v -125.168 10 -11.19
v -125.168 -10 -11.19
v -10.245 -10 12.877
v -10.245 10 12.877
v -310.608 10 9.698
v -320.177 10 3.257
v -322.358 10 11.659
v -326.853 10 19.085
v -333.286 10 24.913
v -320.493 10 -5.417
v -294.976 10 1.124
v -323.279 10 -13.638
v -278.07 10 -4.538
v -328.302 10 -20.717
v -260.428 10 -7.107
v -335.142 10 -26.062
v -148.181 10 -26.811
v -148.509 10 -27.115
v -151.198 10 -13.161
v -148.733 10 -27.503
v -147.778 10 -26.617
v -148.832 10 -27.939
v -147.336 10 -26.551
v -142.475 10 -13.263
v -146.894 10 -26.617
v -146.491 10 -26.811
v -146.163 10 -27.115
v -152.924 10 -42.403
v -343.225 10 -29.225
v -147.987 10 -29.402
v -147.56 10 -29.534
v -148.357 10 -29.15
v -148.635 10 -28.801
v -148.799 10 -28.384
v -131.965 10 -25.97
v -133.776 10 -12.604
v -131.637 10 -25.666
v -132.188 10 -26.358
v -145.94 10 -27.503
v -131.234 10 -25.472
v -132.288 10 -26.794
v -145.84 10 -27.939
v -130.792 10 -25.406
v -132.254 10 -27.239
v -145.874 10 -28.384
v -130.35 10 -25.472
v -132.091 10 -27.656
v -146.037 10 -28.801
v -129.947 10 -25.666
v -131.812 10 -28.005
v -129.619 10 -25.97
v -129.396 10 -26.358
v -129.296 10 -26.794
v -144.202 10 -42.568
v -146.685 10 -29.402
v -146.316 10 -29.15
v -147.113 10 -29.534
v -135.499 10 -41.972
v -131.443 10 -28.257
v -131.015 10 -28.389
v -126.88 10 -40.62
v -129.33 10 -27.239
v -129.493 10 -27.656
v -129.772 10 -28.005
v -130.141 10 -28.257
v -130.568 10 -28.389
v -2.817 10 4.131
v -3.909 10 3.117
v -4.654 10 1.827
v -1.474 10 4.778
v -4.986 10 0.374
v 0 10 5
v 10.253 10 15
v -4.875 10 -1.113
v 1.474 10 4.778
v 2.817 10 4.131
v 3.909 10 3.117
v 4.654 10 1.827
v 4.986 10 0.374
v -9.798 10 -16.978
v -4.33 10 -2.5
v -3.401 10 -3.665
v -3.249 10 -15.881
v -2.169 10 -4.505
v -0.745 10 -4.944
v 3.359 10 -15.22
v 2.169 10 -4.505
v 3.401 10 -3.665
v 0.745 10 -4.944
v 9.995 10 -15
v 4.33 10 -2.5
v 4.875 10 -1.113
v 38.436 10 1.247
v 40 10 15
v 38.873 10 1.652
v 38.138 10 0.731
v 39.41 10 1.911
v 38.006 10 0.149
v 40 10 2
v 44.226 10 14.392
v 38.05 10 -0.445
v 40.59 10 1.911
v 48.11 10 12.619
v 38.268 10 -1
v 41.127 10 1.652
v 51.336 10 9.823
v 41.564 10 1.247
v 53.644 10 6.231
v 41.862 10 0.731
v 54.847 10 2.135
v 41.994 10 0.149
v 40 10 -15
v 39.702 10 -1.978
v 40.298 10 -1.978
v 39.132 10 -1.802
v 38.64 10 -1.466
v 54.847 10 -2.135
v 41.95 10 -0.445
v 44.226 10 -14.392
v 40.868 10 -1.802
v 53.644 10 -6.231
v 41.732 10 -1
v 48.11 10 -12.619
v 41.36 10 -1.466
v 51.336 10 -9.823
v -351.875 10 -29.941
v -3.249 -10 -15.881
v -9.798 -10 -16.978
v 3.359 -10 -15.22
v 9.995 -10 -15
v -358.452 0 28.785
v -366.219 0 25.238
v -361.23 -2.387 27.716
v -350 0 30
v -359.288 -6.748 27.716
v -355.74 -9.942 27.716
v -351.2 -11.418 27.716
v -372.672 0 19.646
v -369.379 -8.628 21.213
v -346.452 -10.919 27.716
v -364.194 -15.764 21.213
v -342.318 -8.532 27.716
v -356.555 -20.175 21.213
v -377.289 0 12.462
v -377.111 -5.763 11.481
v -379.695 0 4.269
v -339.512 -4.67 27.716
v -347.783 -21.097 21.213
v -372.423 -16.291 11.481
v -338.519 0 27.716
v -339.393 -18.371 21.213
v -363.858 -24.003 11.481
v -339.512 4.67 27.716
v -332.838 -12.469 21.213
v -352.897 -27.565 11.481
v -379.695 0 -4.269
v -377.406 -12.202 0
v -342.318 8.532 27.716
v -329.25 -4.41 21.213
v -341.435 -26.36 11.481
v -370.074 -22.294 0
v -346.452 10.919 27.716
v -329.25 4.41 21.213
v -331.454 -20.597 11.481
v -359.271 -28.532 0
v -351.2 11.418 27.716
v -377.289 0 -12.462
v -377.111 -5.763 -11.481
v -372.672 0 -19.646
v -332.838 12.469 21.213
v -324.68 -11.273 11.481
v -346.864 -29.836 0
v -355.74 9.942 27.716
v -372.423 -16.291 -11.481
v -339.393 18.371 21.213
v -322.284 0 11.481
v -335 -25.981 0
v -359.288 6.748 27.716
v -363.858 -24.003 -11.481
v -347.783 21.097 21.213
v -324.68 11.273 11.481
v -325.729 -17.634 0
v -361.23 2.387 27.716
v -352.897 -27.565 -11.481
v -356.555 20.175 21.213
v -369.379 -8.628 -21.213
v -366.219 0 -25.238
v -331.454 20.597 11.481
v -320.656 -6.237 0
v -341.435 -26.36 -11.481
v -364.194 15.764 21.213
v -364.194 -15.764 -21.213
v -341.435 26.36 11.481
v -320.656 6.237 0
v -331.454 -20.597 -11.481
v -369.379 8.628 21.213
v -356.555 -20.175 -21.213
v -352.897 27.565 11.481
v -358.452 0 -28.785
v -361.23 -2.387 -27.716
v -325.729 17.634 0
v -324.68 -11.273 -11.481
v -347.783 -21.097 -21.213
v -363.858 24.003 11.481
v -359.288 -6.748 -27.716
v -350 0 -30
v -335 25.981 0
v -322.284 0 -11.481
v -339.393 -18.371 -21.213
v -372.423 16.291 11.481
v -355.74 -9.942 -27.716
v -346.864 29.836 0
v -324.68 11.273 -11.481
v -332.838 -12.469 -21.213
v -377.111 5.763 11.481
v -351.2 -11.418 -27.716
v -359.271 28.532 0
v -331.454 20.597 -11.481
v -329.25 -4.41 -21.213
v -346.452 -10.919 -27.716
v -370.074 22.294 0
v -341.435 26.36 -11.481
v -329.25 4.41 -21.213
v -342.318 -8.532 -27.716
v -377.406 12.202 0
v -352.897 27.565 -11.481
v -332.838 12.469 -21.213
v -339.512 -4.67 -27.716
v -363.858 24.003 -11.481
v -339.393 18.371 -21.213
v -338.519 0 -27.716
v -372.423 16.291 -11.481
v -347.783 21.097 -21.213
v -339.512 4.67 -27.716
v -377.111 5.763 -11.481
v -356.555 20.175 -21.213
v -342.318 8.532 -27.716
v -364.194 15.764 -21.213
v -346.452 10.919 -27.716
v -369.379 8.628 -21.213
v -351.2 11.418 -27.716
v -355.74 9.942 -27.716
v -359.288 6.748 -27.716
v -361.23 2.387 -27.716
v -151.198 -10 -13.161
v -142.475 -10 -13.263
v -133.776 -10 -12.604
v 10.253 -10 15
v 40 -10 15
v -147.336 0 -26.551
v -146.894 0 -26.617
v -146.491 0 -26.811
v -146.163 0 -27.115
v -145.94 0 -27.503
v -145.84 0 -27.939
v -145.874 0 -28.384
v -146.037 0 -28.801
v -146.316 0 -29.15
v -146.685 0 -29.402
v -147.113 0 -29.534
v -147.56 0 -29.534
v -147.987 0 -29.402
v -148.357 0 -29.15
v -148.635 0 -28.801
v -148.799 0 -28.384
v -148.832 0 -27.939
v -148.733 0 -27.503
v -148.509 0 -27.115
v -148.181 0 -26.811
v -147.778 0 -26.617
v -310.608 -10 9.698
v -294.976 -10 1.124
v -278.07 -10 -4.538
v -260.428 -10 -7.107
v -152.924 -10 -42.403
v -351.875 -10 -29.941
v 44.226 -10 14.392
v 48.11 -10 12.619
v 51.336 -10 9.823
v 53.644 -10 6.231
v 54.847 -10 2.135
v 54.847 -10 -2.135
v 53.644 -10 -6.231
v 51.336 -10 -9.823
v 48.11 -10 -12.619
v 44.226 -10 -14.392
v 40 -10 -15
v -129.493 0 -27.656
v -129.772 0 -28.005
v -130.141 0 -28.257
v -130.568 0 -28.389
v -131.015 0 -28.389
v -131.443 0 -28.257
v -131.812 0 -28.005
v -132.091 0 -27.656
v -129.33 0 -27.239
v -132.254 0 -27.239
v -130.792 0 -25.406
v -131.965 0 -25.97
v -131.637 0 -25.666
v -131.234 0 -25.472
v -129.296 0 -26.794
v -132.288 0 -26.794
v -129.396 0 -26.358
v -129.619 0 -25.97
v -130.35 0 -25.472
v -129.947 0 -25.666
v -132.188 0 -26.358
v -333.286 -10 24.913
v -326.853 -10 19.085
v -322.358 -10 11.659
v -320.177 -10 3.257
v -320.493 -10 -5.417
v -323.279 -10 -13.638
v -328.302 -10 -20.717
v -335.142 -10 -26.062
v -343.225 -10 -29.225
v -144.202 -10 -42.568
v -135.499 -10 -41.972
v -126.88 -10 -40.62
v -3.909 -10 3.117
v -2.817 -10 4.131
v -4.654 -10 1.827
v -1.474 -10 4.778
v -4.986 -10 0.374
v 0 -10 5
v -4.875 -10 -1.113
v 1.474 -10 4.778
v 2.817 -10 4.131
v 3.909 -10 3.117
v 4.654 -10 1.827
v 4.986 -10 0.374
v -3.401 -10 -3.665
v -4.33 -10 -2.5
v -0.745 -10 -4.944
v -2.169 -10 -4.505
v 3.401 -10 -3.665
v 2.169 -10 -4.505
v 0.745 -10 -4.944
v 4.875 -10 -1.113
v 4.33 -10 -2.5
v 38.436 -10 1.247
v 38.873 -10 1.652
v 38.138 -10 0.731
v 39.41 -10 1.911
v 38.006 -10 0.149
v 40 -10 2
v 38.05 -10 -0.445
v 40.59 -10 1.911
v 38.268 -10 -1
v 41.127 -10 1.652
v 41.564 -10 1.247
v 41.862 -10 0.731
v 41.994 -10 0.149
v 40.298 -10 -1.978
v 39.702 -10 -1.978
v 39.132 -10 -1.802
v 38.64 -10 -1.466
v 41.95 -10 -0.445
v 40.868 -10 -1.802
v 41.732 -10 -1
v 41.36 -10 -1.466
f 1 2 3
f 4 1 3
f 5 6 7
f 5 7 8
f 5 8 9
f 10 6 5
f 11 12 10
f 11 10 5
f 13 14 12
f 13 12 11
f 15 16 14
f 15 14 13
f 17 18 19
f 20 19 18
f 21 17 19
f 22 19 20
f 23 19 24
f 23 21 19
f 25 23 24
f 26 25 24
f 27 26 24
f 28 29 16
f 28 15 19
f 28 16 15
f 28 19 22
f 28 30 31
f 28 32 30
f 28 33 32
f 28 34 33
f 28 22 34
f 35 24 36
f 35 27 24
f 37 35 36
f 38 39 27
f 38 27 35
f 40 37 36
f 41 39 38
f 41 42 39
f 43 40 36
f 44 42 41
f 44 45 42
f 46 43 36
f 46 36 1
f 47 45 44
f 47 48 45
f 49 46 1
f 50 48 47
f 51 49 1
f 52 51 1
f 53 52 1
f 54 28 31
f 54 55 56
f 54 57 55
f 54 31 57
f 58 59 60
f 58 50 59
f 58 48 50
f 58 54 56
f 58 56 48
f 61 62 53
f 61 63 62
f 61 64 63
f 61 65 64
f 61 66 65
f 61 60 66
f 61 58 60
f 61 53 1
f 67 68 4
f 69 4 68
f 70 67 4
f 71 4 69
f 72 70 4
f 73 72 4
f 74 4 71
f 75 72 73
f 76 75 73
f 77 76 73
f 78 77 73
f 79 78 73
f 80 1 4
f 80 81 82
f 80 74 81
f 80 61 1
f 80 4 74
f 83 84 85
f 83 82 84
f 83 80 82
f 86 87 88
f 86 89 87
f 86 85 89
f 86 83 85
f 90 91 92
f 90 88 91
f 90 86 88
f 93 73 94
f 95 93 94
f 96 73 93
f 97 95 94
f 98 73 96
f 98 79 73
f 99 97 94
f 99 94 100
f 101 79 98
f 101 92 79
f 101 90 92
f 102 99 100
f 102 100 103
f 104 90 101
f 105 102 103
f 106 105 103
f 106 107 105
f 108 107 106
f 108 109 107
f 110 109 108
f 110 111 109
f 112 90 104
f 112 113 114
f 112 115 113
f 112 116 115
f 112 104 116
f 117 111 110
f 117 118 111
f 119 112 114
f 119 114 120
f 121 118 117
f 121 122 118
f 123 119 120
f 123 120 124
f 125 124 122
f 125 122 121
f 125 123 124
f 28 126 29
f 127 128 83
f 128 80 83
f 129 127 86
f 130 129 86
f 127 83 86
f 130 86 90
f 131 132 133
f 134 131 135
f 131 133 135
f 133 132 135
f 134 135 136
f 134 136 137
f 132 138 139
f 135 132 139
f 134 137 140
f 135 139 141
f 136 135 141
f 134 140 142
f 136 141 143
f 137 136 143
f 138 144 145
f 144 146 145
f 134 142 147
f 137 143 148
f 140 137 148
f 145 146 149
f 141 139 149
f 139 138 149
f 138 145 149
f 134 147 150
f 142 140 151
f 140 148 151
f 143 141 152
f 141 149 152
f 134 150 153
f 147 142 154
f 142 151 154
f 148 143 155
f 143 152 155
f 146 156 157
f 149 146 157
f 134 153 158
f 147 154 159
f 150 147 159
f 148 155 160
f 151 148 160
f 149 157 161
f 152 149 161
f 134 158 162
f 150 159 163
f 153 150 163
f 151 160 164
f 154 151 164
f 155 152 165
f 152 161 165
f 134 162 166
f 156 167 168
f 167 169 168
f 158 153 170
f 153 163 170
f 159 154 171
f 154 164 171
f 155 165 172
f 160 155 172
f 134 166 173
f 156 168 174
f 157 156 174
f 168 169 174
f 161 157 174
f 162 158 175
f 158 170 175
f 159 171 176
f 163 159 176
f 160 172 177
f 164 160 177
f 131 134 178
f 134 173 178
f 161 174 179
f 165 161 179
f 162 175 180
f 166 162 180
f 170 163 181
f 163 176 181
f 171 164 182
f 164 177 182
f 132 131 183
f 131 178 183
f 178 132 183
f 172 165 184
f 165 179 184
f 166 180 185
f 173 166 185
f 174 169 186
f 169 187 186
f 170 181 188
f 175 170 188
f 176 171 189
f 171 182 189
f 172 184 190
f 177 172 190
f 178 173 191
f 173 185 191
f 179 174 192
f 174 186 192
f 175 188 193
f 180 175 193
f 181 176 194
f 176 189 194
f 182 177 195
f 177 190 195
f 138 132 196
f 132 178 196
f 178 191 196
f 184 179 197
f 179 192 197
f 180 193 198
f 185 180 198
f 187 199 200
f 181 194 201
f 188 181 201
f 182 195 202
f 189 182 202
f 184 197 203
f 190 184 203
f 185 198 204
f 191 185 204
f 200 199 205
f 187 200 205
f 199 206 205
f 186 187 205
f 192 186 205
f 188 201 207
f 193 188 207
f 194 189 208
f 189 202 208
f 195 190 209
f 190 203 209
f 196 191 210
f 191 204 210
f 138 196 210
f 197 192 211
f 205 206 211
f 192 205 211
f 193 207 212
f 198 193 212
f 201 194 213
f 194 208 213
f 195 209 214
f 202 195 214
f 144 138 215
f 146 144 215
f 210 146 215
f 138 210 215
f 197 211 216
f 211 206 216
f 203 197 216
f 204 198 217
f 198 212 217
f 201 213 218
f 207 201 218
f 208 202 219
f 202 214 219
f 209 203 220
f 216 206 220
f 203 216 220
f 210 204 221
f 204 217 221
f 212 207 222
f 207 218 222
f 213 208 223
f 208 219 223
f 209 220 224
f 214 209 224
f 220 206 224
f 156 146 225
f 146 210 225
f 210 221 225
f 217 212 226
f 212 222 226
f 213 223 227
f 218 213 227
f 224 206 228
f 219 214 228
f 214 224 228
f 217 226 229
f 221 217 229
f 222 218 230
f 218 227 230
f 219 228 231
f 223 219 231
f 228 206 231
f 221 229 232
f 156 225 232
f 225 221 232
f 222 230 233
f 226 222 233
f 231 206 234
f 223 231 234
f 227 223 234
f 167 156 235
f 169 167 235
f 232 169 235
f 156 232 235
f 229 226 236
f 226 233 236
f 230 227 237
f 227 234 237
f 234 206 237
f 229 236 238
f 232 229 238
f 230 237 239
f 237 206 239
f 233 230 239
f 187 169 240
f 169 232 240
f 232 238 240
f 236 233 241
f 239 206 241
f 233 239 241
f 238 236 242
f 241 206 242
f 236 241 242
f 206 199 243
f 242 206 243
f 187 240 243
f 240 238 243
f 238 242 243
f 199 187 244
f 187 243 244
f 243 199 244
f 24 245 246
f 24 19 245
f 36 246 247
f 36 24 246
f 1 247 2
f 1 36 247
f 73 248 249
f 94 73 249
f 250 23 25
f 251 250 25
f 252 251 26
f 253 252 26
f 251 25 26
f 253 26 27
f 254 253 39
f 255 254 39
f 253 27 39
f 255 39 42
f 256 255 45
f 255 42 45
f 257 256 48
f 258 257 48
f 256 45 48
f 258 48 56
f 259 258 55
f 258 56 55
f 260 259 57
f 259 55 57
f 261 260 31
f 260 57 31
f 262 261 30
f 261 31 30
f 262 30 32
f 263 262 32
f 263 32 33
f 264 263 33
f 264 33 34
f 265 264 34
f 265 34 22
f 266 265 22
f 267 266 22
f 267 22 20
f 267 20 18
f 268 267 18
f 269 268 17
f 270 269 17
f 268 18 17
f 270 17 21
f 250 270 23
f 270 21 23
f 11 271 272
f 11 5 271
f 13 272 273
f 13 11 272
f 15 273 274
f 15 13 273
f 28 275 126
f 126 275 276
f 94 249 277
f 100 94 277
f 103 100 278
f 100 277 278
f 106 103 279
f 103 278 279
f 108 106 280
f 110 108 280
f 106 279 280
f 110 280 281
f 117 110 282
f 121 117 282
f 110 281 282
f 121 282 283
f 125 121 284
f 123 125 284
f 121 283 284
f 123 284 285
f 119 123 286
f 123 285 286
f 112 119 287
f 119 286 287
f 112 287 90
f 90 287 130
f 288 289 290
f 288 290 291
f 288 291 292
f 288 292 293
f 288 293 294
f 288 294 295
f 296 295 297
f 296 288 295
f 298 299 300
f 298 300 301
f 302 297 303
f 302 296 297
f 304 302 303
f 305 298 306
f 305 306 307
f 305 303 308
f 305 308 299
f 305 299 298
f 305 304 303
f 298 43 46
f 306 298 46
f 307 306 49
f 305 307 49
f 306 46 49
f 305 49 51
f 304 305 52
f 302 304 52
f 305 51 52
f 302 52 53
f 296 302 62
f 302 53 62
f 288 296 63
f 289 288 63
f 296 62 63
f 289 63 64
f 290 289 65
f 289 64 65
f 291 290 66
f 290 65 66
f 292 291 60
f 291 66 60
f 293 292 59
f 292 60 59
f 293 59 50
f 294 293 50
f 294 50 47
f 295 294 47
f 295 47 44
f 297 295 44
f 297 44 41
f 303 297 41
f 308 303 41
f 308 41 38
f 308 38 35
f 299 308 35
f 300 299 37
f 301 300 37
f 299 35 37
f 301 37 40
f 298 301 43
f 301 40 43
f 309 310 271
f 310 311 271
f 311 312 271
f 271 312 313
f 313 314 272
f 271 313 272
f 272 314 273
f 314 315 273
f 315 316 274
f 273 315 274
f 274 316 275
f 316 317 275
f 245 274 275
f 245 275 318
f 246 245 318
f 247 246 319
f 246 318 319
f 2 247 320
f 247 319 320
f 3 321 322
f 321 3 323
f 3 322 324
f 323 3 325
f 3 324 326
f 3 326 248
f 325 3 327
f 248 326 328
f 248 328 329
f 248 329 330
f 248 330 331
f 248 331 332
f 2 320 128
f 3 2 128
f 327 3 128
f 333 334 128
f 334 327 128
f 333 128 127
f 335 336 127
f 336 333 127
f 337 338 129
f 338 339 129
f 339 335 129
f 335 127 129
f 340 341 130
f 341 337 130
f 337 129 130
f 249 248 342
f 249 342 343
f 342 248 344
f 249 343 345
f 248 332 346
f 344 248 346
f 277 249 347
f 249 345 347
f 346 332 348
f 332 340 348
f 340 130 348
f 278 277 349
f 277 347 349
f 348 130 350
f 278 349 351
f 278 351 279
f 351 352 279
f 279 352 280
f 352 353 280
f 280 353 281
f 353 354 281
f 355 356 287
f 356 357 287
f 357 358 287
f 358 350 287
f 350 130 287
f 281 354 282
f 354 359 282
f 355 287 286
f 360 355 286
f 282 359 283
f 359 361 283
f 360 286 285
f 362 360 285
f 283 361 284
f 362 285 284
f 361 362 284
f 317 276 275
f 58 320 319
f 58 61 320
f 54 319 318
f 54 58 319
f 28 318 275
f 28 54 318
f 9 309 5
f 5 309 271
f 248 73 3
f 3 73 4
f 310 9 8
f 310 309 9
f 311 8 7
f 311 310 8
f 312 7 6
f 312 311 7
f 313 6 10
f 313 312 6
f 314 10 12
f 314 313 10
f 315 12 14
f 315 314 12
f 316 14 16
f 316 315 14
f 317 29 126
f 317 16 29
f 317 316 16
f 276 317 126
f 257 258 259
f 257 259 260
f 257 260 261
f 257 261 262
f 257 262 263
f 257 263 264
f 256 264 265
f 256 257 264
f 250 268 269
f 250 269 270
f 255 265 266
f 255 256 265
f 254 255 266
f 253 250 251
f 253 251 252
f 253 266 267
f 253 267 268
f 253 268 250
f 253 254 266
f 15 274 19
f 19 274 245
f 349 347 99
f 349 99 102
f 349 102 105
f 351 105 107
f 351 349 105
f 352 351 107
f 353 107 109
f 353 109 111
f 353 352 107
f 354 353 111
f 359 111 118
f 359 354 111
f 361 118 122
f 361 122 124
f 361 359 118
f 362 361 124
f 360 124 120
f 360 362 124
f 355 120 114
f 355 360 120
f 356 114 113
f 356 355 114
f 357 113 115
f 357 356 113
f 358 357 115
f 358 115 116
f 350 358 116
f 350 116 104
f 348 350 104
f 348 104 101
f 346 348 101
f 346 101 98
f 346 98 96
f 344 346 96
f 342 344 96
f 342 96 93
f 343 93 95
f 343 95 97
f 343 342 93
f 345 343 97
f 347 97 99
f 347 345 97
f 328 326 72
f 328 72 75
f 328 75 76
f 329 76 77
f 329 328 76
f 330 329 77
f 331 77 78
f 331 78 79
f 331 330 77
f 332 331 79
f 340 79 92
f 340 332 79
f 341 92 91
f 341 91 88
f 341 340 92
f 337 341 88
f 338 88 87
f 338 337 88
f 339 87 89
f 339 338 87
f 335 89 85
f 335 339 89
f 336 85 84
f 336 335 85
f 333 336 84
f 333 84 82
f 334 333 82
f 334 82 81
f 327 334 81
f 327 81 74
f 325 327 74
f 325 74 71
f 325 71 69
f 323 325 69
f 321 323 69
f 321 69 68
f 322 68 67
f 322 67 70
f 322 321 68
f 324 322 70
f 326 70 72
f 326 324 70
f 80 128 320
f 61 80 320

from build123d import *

# Parameters (mm, degrees)
BOSS_EXTRUDE1_DEPTH      = 10
BOSS_EXTRUDE1_DEPTH_BACK = 10
SKETCH1_R                = 5
SKETCH1_R_2              = 2
FILLET1_R                = 100
SKETCH2_R                = 1.5
CUT_EXTRUDE1_DEPTH       = 10
CUT_EXTRUDE2_DEPTH       = 10
CUT_EXTRUDE2_DEPTH_BACK  = 10
SKETCH3_R                = 30


with BuildPart() as part:
    # Sketch1 → Boss-Extrude1 (new, two sides: drawn at the far end of the back side and taken through both)
    with BuildSketch(Plane(origin=(0, 0, 0), x_dir=(1, 0, 0), z_dir=(0, 1, 0)).offset(-BOSS_EXTRUDE1_DEPTH_BACK)):
        with BuildLine():
            Line((-138.053278996, 13.889014505), (-5.919683, -13.782501703))
            Line((-5.919683, -13.782501703), (0, -15))
            Line((0, -15), (40, -15))
            ThreePointArc((40, -15), (55, 0), (40, 15))
            Line((40, 15), (0, 15))
            Line((0, 15), (-139.784941349, 43.225909045))
            Line((-139.784941349, 43.225909045), (-351.875415017, 29.941322925))
            ThreePointArc((-351.875415017, 29.941322925), (-378.412739548, -9.628926804), (-333.285739517, -24.912516864))
            Line((-333.285739517, -24.912516864), (-287.823465989, 5.588948968))
            Line((-287.823465989, 5.588948968), (-138.053278996, 13.889014505))
        make_face()
        Circle(SKETCH1_R, mode=Mode.SUBTRACT)
        with Locations((40, 0)):
            Circle(SKETCH1_R_2, mode=Mode.SUBTRACT)
    extrude(amount=BOSS_EXTRUDE1_DEPTH + BOSS_EXTRUDE1_DEPTH_BACK)

    # Fillet1
    fillet1_edges = [part.edges().sort_by_distance(p)[0] for p in [
        (0, 0, -15),
        (-139.784941349, 0, -43.225909045),
        (-138.053278996, 0, -13.889014505),
        (-287.823465989, 0, -5.588948968),
        (0, 0, 15),
    ]]
    fillet(fillet1_edges, radius=FILLET1_R)

    # Sketch2 → Cut-Extrude1 (cut)
    with BuildSketch(Plane(origin=(0, 10, 0), x_dir=(1, 0, 0), z_dir=(0, 1, 0))):
        with Locations((-147.336246923, 28.050603479)):
            Circle(SKETCH2_R)
        with Locations((-130.791911053, 26.905656844)):
            Circle(SKETCH2_R)
        with Locations((-364.746711272, 9.415773639)):
            Circle(SKETCH2_R)
        with Locations((-348.032450789, -15.496743225)):
            Circle(SKETCH2_R)
    extrude(amount=-CUT_EXTRUDE1_DEPTH, mode=Mode.SUBTRACT)

    # Sketch3 → Cut-Extrude2 (cut, two sides: drawn at the far end of the back side and taken through both)
    with BuildSketch(Plane(origin=(0, 0, 0), x_dir=(1, 0, 0), z_dir=(0, 1, 0)).offset(-CUT_EXTRUDE2_DEPTH_BACK)):
        with Locations((-350, 0)):
            Circle(SKETCH3_R)
    extrude(amount=CUT_EXTRUDE2_DEPTH + CUT_EXTRUDE2_DEPTH_BACK, mode=Mode.SUBTRACT)


with BuildPart() as body_2:
    # Sketch4 → Revolve6 (revolve)
    with BuildSketch(Plane(origin=(0, 0, 0), x_dir=(1, 0, 0), z_dir=(0, 1, 0))):
        with BuildLine():
            Line((-350, 30), (-350, -30))
            ThreePointArc((-350, -30), (-380, 0), (-350, 30))
        make_face()
    revolve(axis=Axis((-350, 0, -30), (0, 0, 1)))


solid = Compound([part.part, body_2.part])
